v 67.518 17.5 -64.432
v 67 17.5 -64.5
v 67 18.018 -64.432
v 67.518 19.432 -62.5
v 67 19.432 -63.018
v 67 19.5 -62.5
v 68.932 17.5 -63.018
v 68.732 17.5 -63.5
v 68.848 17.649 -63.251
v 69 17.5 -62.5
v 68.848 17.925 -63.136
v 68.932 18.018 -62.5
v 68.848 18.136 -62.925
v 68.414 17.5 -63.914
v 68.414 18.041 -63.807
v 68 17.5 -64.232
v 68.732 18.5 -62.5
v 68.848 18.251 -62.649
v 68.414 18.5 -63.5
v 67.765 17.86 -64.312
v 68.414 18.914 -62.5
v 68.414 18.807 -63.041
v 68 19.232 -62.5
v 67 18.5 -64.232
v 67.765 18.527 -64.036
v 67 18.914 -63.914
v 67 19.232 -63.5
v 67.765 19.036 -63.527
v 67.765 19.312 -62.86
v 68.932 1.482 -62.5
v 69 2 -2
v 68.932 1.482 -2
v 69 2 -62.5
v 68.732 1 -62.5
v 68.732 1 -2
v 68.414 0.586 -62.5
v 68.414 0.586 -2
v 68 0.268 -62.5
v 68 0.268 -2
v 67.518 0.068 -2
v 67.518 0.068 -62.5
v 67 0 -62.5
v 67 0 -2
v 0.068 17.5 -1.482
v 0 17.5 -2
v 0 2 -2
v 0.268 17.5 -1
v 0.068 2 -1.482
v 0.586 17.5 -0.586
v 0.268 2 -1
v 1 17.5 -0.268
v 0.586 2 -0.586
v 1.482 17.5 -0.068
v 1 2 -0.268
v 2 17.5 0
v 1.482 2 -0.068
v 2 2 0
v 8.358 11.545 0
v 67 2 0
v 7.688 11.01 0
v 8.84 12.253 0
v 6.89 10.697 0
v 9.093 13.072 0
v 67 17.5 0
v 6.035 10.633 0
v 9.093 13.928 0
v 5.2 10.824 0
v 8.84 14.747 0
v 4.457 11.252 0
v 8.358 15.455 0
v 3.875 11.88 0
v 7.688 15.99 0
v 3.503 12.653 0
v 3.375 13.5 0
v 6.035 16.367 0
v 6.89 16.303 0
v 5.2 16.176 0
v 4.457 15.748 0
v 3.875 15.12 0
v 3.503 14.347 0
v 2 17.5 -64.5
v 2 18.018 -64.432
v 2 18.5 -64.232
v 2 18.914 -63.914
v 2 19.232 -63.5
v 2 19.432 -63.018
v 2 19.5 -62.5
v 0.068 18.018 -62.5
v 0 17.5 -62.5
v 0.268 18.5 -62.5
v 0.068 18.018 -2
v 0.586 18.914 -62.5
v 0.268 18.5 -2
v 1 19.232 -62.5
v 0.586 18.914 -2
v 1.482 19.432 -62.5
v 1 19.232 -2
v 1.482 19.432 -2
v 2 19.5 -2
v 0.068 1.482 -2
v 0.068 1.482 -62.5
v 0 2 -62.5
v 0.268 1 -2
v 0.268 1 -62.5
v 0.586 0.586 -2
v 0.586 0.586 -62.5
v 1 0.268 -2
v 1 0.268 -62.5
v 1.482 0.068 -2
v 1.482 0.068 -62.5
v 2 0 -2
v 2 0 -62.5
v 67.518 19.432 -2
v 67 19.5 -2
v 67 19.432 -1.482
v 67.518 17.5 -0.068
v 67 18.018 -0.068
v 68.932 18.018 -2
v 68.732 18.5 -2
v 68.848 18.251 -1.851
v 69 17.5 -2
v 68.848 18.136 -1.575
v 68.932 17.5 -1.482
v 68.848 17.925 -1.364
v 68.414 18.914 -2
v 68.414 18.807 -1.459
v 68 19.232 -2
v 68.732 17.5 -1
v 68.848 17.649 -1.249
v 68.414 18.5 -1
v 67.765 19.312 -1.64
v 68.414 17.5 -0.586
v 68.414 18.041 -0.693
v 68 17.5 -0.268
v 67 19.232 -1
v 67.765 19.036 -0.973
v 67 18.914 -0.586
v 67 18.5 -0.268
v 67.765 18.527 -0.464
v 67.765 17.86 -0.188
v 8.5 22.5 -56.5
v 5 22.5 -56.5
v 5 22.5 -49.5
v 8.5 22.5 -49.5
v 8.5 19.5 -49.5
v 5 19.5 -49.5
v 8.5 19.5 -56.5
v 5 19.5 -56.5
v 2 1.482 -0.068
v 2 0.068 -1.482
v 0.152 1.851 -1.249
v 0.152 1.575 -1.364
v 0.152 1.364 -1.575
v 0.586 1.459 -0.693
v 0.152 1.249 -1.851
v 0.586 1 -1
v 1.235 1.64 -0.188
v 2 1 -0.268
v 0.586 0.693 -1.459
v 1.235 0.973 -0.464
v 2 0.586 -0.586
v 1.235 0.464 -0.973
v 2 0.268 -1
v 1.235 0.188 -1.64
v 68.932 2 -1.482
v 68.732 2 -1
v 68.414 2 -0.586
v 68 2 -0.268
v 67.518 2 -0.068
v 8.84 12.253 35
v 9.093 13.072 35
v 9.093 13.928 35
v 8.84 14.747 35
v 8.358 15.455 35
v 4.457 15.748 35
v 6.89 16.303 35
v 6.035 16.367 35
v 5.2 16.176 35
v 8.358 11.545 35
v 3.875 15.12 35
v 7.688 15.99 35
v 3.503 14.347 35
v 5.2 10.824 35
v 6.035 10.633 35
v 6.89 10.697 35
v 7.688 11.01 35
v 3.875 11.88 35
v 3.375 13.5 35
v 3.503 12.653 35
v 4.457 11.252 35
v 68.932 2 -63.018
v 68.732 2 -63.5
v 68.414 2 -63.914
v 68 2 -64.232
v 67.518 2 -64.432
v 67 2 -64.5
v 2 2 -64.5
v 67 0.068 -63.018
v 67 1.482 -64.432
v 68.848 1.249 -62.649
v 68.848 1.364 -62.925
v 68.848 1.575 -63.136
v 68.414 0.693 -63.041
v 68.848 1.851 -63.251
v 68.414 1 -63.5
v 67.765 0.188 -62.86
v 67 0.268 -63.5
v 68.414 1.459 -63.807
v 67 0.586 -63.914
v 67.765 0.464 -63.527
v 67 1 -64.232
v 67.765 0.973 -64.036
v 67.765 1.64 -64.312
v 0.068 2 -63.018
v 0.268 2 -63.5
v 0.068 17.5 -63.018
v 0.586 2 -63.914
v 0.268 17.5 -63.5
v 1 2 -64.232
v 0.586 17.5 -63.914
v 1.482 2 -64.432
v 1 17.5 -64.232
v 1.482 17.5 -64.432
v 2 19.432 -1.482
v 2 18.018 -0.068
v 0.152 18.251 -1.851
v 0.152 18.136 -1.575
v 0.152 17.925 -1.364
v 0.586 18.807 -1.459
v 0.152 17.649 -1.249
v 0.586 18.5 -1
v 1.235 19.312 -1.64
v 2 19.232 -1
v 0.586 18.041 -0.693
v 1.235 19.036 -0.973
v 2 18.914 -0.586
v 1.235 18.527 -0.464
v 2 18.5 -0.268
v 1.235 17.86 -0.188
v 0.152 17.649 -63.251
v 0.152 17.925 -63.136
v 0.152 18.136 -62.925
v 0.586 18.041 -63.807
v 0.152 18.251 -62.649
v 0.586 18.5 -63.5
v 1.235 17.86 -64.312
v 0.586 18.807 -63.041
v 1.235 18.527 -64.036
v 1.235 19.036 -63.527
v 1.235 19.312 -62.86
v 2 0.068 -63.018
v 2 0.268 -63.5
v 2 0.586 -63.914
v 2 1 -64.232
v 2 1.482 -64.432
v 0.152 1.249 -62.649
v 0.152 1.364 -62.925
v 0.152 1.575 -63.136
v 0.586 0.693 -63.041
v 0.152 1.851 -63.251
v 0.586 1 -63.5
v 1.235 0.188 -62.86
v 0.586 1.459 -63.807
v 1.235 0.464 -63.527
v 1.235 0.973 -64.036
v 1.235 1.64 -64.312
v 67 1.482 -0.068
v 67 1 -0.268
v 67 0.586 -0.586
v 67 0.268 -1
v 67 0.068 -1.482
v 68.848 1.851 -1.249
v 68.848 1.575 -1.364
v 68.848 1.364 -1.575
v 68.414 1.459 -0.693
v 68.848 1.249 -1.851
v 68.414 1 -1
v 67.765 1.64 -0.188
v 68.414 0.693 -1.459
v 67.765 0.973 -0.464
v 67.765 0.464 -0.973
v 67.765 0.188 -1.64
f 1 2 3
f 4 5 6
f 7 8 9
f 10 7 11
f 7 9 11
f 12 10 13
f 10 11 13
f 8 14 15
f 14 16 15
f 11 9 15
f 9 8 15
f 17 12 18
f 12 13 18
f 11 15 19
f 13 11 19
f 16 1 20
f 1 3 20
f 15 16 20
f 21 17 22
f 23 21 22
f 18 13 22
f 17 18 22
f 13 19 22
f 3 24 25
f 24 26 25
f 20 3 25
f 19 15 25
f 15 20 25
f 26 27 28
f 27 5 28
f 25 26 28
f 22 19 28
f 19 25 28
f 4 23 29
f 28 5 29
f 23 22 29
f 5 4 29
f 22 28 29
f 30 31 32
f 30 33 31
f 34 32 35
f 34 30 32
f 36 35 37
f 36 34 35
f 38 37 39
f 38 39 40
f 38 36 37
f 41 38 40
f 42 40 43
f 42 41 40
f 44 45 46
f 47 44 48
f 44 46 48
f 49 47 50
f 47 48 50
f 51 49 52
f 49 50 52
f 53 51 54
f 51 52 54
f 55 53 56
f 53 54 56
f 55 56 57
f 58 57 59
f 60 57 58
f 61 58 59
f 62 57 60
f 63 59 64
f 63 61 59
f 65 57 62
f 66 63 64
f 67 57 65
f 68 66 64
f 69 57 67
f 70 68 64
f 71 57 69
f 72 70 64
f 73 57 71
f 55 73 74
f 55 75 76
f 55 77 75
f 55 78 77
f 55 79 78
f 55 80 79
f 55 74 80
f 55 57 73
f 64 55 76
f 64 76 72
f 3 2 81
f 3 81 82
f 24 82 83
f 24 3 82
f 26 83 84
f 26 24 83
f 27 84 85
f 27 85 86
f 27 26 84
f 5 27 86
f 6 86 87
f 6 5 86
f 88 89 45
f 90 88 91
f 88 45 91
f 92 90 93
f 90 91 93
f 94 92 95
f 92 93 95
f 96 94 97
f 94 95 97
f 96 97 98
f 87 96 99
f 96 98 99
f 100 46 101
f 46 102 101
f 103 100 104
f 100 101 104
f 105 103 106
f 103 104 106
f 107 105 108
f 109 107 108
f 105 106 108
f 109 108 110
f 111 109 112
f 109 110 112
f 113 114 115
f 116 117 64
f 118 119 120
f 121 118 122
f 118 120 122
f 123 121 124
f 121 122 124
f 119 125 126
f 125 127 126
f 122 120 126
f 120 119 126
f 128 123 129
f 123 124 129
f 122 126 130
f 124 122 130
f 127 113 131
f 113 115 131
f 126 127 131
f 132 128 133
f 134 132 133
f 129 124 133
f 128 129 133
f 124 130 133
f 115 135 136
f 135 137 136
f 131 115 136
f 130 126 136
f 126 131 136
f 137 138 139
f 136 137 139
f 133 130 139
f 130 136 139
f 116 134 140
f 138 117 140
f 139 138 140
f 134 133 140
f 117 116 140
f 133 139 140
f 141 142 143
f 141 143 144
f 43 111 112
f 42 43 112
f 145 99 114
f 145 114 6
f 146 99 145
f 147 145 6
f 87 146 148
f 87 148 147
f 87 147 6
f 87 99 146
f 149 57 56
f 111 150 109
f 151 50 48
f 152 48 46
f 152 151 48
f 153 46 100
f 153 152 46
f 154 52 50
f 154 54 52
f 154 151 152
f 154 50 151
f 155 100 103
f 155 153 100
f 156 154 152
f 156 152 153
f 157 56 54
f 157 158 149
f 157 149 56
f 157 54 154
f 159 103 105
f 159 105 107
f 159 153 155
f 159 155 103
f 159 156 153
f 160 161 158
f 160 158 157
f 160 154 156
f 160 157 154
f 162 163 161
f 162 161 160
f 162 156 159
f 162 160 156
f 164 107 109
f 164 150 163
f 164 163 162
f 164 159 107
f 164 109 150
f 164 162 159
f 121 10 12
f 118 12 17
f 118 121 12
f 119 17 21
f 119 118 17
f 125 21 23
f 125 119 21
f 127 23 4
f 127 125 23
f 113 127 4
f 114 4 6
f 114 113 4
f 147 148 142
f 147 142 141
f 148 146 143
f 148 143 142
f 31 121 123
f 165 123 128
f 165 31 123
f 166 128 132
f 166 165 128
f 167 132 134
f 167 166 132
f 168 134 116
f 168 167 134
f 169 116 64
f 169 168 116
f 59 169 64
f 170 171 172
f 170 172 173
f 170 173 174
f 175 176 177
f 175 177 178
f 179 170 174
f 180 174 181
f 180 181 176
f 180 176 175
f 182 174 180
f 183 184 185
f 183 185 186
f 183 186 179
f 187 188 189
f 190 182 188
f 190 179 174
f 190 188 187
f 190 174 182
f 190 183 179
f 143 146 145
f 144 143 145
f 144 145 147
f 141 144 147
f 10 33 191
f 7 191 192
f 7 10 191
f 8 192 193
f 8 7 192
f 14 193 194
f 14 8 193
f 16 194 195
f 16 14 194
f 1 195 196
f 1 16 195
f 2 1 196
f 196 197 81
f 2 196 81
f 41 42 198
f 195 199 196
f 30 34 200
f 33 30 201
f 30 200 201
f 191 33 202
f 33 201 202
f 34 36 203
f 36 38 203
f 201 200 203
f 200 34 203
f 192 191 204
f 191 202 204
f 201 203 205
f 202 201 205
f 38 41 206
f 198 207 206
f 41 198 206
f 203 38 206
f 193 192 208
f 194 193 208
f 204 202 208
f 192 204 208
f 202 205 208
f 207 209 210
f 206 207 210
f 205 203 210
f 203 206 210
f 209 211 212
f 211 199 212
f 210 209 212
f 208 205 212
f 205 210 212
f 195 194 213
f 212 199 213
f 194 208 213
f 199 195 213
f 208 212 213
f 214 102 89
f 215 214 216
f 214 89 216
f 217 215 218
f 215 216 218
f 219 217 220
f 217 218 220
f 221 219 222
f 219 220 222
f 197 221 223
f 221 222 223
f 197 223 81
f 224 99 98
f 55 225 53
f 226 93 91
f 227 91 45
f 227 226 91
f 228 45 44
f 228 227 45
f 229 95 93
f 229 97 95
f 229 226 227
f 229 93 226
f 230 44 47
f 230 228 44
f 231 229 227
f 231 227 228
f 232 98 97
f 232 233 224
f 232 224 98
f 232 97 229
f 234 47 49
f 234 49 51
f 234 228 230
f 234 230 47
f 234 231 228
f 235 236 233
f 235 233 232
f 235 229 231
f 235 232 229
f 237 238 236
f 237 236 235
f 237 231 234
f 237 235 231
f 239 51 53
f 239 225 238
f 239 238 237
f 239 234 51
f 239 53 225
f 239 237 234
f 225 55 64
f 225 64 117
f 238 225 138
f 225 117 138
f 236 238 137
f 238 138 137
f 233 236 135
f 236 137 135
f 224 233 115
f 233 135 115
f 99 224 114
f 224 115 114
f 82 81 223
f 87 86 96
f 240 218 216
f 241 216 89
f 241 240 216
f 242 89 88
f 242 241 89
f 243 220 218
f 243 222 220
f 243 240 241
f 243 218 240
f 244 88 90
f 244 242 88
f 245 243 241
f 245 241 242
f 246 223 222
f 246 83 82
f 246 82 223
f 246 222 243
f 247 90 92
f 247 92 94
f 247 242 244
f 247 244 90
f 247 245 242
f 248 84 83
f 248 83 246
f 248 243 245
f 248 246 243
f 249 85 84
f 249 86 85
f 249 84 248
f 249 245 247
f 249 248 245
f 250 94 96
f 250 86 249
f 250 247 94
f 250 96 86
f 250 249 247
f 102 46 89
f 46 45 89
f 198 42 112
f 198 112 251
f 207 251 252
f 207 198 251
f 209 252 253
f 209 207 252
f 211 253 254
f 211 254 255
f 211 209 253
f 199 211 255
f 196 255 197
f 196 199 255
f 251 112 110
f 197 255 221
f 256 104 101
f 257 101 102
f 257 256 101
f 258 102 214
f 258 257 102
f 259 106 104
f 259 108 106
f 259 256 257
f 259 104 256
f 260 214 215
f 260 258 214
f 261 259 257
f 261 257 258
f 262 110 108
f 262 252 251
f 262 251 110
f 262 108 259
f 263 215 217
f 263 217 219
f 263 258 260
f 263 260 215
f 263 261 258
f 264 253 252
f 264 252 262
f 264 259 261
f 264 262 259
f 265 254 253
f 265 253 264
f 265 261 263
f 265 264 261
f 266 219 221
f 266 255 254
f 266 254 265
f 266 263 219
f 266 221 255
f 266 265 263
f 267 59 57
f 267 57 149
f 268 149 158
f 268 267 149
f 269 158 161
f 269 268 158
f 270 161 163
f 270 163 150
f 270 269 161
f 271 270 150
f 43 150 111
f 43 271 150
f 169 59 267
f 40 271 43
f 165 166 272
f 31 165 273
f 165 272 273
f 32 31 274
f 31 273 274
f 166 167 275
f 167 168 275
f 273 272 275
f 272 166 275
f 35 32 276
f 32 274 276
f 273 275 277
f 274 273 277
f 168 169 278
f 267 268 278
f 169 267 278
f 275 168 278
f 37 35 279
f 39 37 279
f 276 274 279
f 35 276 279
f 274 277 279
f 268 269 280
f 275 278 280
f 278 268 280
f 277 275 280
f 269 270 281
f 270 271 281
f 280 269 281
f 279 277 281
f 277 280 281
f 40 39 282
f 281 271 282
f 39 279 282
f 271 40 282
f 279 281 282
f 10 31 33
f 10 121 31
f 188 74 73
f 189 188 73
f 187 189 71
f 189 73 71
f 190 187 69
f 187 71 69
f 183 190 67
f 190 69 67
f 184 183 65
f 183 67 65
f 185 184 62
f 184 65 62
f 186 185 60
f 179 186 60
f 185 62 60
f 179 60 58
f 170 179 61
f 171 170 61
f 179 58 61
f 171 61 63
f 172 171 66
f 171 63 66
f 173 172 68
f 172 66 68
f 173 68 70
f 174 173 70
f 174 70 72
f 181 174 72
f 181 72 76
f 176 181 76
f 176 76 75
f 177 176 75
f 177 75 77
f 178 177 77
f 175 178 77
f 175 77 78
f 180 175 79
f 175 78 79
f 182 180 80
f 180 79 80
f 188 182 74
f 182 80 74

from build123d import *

# Parameters (mm, degrees)
SKETCH1_W           = 64.5
SKETCH1_H           = 19.5
BOSS_EXTRUDE1_DEPTH = 69
FILLET1_R           = 2
FILLET2_R           = 2
SKETCH2_R           = 2.875
BOSS_EXTRUDE2_DEPTH = 35
SKETCH3_W           = 3.5
SKETCH3_H           = 7
BOSS_EXTRUDE3_DEPTH = 3


with BuildPart() as part:
    # Sketch1 → Boss-Extrude1 (new body)
    with BuildSketch(Plane(origin=(0, 0, 0), x_dir=(0, 0, -1), z_dir=(1, 0, 0))):
        with Locations((32.25, 9.75)):
            Rectangle(SKETCH1_W, SKETCH1_H)
    extrude(amount=BOSS_EXTRUDE1_DEPTH)

    # Fillet1
    fillet1_edges = [part.edges().sort_by_distance(p)[0] for p in [
        (34.5, 19.5, 0),
        (34.5, 19.5, -64.5),
        (34.5, 0, -64.5),
        (34.5, 0, 0),
    ]]
    fillet(fillet1_edges, radius=FILLET1_R)

    # Fillet2
    fillet2_edges = [part.edges().sort_by_distance(p)[0] for p in [
        (0, 0, -32.25),
        (69, 0, -32.25),
        (0, 9.75, 0),
        (0, 19.5, -32.25),
        (0, 9.75, -64.5),
        (0, 18.914213562, -63.914213562),
        (0, 0.585786438, -63.914213562),
        (0, 18.914213562, -0.585786438),
        (0, 0.585786438, -0.585786438),
        (69, 9.75, 0),
        (69, 9.75, -64.5),
        (69, 19.5, -32.25),
        (69, 18.914213562, -63.914213562),
        (69, 0.585786438, -63.914213562),
        (69, 18.914213562, -0.585786438),
        (69, 0.585786438, -0.585786438),
    ]]
    fillet(fillet2_edges, radius=FILLET2_R)

    # Sketch2 → Boss-Extrude2 (add)
    with BuildSketch(Plane.XY):
        with Locations(Location((6.25, 13.5, 0), (0, 0, 180))):
            Circle(SKETCH2_R)
    extrude(amount=BOSS_EXTRUDE2_DEPTH)

    # Sketch3 → Boss-Extrude3 (add)
    with BuildSketch(Plane(origin=(0, 19.5, 0), x_dir=(1, 0, 0), z_dir=(0, 1, 0))):
        with Locations((6.75, 53)):
            Rectangle(SKETCH3_W, SKETCH3_H)
    extrude(amount=BOSS_EXTRUDE3_DEPTH)


solid = part.part
